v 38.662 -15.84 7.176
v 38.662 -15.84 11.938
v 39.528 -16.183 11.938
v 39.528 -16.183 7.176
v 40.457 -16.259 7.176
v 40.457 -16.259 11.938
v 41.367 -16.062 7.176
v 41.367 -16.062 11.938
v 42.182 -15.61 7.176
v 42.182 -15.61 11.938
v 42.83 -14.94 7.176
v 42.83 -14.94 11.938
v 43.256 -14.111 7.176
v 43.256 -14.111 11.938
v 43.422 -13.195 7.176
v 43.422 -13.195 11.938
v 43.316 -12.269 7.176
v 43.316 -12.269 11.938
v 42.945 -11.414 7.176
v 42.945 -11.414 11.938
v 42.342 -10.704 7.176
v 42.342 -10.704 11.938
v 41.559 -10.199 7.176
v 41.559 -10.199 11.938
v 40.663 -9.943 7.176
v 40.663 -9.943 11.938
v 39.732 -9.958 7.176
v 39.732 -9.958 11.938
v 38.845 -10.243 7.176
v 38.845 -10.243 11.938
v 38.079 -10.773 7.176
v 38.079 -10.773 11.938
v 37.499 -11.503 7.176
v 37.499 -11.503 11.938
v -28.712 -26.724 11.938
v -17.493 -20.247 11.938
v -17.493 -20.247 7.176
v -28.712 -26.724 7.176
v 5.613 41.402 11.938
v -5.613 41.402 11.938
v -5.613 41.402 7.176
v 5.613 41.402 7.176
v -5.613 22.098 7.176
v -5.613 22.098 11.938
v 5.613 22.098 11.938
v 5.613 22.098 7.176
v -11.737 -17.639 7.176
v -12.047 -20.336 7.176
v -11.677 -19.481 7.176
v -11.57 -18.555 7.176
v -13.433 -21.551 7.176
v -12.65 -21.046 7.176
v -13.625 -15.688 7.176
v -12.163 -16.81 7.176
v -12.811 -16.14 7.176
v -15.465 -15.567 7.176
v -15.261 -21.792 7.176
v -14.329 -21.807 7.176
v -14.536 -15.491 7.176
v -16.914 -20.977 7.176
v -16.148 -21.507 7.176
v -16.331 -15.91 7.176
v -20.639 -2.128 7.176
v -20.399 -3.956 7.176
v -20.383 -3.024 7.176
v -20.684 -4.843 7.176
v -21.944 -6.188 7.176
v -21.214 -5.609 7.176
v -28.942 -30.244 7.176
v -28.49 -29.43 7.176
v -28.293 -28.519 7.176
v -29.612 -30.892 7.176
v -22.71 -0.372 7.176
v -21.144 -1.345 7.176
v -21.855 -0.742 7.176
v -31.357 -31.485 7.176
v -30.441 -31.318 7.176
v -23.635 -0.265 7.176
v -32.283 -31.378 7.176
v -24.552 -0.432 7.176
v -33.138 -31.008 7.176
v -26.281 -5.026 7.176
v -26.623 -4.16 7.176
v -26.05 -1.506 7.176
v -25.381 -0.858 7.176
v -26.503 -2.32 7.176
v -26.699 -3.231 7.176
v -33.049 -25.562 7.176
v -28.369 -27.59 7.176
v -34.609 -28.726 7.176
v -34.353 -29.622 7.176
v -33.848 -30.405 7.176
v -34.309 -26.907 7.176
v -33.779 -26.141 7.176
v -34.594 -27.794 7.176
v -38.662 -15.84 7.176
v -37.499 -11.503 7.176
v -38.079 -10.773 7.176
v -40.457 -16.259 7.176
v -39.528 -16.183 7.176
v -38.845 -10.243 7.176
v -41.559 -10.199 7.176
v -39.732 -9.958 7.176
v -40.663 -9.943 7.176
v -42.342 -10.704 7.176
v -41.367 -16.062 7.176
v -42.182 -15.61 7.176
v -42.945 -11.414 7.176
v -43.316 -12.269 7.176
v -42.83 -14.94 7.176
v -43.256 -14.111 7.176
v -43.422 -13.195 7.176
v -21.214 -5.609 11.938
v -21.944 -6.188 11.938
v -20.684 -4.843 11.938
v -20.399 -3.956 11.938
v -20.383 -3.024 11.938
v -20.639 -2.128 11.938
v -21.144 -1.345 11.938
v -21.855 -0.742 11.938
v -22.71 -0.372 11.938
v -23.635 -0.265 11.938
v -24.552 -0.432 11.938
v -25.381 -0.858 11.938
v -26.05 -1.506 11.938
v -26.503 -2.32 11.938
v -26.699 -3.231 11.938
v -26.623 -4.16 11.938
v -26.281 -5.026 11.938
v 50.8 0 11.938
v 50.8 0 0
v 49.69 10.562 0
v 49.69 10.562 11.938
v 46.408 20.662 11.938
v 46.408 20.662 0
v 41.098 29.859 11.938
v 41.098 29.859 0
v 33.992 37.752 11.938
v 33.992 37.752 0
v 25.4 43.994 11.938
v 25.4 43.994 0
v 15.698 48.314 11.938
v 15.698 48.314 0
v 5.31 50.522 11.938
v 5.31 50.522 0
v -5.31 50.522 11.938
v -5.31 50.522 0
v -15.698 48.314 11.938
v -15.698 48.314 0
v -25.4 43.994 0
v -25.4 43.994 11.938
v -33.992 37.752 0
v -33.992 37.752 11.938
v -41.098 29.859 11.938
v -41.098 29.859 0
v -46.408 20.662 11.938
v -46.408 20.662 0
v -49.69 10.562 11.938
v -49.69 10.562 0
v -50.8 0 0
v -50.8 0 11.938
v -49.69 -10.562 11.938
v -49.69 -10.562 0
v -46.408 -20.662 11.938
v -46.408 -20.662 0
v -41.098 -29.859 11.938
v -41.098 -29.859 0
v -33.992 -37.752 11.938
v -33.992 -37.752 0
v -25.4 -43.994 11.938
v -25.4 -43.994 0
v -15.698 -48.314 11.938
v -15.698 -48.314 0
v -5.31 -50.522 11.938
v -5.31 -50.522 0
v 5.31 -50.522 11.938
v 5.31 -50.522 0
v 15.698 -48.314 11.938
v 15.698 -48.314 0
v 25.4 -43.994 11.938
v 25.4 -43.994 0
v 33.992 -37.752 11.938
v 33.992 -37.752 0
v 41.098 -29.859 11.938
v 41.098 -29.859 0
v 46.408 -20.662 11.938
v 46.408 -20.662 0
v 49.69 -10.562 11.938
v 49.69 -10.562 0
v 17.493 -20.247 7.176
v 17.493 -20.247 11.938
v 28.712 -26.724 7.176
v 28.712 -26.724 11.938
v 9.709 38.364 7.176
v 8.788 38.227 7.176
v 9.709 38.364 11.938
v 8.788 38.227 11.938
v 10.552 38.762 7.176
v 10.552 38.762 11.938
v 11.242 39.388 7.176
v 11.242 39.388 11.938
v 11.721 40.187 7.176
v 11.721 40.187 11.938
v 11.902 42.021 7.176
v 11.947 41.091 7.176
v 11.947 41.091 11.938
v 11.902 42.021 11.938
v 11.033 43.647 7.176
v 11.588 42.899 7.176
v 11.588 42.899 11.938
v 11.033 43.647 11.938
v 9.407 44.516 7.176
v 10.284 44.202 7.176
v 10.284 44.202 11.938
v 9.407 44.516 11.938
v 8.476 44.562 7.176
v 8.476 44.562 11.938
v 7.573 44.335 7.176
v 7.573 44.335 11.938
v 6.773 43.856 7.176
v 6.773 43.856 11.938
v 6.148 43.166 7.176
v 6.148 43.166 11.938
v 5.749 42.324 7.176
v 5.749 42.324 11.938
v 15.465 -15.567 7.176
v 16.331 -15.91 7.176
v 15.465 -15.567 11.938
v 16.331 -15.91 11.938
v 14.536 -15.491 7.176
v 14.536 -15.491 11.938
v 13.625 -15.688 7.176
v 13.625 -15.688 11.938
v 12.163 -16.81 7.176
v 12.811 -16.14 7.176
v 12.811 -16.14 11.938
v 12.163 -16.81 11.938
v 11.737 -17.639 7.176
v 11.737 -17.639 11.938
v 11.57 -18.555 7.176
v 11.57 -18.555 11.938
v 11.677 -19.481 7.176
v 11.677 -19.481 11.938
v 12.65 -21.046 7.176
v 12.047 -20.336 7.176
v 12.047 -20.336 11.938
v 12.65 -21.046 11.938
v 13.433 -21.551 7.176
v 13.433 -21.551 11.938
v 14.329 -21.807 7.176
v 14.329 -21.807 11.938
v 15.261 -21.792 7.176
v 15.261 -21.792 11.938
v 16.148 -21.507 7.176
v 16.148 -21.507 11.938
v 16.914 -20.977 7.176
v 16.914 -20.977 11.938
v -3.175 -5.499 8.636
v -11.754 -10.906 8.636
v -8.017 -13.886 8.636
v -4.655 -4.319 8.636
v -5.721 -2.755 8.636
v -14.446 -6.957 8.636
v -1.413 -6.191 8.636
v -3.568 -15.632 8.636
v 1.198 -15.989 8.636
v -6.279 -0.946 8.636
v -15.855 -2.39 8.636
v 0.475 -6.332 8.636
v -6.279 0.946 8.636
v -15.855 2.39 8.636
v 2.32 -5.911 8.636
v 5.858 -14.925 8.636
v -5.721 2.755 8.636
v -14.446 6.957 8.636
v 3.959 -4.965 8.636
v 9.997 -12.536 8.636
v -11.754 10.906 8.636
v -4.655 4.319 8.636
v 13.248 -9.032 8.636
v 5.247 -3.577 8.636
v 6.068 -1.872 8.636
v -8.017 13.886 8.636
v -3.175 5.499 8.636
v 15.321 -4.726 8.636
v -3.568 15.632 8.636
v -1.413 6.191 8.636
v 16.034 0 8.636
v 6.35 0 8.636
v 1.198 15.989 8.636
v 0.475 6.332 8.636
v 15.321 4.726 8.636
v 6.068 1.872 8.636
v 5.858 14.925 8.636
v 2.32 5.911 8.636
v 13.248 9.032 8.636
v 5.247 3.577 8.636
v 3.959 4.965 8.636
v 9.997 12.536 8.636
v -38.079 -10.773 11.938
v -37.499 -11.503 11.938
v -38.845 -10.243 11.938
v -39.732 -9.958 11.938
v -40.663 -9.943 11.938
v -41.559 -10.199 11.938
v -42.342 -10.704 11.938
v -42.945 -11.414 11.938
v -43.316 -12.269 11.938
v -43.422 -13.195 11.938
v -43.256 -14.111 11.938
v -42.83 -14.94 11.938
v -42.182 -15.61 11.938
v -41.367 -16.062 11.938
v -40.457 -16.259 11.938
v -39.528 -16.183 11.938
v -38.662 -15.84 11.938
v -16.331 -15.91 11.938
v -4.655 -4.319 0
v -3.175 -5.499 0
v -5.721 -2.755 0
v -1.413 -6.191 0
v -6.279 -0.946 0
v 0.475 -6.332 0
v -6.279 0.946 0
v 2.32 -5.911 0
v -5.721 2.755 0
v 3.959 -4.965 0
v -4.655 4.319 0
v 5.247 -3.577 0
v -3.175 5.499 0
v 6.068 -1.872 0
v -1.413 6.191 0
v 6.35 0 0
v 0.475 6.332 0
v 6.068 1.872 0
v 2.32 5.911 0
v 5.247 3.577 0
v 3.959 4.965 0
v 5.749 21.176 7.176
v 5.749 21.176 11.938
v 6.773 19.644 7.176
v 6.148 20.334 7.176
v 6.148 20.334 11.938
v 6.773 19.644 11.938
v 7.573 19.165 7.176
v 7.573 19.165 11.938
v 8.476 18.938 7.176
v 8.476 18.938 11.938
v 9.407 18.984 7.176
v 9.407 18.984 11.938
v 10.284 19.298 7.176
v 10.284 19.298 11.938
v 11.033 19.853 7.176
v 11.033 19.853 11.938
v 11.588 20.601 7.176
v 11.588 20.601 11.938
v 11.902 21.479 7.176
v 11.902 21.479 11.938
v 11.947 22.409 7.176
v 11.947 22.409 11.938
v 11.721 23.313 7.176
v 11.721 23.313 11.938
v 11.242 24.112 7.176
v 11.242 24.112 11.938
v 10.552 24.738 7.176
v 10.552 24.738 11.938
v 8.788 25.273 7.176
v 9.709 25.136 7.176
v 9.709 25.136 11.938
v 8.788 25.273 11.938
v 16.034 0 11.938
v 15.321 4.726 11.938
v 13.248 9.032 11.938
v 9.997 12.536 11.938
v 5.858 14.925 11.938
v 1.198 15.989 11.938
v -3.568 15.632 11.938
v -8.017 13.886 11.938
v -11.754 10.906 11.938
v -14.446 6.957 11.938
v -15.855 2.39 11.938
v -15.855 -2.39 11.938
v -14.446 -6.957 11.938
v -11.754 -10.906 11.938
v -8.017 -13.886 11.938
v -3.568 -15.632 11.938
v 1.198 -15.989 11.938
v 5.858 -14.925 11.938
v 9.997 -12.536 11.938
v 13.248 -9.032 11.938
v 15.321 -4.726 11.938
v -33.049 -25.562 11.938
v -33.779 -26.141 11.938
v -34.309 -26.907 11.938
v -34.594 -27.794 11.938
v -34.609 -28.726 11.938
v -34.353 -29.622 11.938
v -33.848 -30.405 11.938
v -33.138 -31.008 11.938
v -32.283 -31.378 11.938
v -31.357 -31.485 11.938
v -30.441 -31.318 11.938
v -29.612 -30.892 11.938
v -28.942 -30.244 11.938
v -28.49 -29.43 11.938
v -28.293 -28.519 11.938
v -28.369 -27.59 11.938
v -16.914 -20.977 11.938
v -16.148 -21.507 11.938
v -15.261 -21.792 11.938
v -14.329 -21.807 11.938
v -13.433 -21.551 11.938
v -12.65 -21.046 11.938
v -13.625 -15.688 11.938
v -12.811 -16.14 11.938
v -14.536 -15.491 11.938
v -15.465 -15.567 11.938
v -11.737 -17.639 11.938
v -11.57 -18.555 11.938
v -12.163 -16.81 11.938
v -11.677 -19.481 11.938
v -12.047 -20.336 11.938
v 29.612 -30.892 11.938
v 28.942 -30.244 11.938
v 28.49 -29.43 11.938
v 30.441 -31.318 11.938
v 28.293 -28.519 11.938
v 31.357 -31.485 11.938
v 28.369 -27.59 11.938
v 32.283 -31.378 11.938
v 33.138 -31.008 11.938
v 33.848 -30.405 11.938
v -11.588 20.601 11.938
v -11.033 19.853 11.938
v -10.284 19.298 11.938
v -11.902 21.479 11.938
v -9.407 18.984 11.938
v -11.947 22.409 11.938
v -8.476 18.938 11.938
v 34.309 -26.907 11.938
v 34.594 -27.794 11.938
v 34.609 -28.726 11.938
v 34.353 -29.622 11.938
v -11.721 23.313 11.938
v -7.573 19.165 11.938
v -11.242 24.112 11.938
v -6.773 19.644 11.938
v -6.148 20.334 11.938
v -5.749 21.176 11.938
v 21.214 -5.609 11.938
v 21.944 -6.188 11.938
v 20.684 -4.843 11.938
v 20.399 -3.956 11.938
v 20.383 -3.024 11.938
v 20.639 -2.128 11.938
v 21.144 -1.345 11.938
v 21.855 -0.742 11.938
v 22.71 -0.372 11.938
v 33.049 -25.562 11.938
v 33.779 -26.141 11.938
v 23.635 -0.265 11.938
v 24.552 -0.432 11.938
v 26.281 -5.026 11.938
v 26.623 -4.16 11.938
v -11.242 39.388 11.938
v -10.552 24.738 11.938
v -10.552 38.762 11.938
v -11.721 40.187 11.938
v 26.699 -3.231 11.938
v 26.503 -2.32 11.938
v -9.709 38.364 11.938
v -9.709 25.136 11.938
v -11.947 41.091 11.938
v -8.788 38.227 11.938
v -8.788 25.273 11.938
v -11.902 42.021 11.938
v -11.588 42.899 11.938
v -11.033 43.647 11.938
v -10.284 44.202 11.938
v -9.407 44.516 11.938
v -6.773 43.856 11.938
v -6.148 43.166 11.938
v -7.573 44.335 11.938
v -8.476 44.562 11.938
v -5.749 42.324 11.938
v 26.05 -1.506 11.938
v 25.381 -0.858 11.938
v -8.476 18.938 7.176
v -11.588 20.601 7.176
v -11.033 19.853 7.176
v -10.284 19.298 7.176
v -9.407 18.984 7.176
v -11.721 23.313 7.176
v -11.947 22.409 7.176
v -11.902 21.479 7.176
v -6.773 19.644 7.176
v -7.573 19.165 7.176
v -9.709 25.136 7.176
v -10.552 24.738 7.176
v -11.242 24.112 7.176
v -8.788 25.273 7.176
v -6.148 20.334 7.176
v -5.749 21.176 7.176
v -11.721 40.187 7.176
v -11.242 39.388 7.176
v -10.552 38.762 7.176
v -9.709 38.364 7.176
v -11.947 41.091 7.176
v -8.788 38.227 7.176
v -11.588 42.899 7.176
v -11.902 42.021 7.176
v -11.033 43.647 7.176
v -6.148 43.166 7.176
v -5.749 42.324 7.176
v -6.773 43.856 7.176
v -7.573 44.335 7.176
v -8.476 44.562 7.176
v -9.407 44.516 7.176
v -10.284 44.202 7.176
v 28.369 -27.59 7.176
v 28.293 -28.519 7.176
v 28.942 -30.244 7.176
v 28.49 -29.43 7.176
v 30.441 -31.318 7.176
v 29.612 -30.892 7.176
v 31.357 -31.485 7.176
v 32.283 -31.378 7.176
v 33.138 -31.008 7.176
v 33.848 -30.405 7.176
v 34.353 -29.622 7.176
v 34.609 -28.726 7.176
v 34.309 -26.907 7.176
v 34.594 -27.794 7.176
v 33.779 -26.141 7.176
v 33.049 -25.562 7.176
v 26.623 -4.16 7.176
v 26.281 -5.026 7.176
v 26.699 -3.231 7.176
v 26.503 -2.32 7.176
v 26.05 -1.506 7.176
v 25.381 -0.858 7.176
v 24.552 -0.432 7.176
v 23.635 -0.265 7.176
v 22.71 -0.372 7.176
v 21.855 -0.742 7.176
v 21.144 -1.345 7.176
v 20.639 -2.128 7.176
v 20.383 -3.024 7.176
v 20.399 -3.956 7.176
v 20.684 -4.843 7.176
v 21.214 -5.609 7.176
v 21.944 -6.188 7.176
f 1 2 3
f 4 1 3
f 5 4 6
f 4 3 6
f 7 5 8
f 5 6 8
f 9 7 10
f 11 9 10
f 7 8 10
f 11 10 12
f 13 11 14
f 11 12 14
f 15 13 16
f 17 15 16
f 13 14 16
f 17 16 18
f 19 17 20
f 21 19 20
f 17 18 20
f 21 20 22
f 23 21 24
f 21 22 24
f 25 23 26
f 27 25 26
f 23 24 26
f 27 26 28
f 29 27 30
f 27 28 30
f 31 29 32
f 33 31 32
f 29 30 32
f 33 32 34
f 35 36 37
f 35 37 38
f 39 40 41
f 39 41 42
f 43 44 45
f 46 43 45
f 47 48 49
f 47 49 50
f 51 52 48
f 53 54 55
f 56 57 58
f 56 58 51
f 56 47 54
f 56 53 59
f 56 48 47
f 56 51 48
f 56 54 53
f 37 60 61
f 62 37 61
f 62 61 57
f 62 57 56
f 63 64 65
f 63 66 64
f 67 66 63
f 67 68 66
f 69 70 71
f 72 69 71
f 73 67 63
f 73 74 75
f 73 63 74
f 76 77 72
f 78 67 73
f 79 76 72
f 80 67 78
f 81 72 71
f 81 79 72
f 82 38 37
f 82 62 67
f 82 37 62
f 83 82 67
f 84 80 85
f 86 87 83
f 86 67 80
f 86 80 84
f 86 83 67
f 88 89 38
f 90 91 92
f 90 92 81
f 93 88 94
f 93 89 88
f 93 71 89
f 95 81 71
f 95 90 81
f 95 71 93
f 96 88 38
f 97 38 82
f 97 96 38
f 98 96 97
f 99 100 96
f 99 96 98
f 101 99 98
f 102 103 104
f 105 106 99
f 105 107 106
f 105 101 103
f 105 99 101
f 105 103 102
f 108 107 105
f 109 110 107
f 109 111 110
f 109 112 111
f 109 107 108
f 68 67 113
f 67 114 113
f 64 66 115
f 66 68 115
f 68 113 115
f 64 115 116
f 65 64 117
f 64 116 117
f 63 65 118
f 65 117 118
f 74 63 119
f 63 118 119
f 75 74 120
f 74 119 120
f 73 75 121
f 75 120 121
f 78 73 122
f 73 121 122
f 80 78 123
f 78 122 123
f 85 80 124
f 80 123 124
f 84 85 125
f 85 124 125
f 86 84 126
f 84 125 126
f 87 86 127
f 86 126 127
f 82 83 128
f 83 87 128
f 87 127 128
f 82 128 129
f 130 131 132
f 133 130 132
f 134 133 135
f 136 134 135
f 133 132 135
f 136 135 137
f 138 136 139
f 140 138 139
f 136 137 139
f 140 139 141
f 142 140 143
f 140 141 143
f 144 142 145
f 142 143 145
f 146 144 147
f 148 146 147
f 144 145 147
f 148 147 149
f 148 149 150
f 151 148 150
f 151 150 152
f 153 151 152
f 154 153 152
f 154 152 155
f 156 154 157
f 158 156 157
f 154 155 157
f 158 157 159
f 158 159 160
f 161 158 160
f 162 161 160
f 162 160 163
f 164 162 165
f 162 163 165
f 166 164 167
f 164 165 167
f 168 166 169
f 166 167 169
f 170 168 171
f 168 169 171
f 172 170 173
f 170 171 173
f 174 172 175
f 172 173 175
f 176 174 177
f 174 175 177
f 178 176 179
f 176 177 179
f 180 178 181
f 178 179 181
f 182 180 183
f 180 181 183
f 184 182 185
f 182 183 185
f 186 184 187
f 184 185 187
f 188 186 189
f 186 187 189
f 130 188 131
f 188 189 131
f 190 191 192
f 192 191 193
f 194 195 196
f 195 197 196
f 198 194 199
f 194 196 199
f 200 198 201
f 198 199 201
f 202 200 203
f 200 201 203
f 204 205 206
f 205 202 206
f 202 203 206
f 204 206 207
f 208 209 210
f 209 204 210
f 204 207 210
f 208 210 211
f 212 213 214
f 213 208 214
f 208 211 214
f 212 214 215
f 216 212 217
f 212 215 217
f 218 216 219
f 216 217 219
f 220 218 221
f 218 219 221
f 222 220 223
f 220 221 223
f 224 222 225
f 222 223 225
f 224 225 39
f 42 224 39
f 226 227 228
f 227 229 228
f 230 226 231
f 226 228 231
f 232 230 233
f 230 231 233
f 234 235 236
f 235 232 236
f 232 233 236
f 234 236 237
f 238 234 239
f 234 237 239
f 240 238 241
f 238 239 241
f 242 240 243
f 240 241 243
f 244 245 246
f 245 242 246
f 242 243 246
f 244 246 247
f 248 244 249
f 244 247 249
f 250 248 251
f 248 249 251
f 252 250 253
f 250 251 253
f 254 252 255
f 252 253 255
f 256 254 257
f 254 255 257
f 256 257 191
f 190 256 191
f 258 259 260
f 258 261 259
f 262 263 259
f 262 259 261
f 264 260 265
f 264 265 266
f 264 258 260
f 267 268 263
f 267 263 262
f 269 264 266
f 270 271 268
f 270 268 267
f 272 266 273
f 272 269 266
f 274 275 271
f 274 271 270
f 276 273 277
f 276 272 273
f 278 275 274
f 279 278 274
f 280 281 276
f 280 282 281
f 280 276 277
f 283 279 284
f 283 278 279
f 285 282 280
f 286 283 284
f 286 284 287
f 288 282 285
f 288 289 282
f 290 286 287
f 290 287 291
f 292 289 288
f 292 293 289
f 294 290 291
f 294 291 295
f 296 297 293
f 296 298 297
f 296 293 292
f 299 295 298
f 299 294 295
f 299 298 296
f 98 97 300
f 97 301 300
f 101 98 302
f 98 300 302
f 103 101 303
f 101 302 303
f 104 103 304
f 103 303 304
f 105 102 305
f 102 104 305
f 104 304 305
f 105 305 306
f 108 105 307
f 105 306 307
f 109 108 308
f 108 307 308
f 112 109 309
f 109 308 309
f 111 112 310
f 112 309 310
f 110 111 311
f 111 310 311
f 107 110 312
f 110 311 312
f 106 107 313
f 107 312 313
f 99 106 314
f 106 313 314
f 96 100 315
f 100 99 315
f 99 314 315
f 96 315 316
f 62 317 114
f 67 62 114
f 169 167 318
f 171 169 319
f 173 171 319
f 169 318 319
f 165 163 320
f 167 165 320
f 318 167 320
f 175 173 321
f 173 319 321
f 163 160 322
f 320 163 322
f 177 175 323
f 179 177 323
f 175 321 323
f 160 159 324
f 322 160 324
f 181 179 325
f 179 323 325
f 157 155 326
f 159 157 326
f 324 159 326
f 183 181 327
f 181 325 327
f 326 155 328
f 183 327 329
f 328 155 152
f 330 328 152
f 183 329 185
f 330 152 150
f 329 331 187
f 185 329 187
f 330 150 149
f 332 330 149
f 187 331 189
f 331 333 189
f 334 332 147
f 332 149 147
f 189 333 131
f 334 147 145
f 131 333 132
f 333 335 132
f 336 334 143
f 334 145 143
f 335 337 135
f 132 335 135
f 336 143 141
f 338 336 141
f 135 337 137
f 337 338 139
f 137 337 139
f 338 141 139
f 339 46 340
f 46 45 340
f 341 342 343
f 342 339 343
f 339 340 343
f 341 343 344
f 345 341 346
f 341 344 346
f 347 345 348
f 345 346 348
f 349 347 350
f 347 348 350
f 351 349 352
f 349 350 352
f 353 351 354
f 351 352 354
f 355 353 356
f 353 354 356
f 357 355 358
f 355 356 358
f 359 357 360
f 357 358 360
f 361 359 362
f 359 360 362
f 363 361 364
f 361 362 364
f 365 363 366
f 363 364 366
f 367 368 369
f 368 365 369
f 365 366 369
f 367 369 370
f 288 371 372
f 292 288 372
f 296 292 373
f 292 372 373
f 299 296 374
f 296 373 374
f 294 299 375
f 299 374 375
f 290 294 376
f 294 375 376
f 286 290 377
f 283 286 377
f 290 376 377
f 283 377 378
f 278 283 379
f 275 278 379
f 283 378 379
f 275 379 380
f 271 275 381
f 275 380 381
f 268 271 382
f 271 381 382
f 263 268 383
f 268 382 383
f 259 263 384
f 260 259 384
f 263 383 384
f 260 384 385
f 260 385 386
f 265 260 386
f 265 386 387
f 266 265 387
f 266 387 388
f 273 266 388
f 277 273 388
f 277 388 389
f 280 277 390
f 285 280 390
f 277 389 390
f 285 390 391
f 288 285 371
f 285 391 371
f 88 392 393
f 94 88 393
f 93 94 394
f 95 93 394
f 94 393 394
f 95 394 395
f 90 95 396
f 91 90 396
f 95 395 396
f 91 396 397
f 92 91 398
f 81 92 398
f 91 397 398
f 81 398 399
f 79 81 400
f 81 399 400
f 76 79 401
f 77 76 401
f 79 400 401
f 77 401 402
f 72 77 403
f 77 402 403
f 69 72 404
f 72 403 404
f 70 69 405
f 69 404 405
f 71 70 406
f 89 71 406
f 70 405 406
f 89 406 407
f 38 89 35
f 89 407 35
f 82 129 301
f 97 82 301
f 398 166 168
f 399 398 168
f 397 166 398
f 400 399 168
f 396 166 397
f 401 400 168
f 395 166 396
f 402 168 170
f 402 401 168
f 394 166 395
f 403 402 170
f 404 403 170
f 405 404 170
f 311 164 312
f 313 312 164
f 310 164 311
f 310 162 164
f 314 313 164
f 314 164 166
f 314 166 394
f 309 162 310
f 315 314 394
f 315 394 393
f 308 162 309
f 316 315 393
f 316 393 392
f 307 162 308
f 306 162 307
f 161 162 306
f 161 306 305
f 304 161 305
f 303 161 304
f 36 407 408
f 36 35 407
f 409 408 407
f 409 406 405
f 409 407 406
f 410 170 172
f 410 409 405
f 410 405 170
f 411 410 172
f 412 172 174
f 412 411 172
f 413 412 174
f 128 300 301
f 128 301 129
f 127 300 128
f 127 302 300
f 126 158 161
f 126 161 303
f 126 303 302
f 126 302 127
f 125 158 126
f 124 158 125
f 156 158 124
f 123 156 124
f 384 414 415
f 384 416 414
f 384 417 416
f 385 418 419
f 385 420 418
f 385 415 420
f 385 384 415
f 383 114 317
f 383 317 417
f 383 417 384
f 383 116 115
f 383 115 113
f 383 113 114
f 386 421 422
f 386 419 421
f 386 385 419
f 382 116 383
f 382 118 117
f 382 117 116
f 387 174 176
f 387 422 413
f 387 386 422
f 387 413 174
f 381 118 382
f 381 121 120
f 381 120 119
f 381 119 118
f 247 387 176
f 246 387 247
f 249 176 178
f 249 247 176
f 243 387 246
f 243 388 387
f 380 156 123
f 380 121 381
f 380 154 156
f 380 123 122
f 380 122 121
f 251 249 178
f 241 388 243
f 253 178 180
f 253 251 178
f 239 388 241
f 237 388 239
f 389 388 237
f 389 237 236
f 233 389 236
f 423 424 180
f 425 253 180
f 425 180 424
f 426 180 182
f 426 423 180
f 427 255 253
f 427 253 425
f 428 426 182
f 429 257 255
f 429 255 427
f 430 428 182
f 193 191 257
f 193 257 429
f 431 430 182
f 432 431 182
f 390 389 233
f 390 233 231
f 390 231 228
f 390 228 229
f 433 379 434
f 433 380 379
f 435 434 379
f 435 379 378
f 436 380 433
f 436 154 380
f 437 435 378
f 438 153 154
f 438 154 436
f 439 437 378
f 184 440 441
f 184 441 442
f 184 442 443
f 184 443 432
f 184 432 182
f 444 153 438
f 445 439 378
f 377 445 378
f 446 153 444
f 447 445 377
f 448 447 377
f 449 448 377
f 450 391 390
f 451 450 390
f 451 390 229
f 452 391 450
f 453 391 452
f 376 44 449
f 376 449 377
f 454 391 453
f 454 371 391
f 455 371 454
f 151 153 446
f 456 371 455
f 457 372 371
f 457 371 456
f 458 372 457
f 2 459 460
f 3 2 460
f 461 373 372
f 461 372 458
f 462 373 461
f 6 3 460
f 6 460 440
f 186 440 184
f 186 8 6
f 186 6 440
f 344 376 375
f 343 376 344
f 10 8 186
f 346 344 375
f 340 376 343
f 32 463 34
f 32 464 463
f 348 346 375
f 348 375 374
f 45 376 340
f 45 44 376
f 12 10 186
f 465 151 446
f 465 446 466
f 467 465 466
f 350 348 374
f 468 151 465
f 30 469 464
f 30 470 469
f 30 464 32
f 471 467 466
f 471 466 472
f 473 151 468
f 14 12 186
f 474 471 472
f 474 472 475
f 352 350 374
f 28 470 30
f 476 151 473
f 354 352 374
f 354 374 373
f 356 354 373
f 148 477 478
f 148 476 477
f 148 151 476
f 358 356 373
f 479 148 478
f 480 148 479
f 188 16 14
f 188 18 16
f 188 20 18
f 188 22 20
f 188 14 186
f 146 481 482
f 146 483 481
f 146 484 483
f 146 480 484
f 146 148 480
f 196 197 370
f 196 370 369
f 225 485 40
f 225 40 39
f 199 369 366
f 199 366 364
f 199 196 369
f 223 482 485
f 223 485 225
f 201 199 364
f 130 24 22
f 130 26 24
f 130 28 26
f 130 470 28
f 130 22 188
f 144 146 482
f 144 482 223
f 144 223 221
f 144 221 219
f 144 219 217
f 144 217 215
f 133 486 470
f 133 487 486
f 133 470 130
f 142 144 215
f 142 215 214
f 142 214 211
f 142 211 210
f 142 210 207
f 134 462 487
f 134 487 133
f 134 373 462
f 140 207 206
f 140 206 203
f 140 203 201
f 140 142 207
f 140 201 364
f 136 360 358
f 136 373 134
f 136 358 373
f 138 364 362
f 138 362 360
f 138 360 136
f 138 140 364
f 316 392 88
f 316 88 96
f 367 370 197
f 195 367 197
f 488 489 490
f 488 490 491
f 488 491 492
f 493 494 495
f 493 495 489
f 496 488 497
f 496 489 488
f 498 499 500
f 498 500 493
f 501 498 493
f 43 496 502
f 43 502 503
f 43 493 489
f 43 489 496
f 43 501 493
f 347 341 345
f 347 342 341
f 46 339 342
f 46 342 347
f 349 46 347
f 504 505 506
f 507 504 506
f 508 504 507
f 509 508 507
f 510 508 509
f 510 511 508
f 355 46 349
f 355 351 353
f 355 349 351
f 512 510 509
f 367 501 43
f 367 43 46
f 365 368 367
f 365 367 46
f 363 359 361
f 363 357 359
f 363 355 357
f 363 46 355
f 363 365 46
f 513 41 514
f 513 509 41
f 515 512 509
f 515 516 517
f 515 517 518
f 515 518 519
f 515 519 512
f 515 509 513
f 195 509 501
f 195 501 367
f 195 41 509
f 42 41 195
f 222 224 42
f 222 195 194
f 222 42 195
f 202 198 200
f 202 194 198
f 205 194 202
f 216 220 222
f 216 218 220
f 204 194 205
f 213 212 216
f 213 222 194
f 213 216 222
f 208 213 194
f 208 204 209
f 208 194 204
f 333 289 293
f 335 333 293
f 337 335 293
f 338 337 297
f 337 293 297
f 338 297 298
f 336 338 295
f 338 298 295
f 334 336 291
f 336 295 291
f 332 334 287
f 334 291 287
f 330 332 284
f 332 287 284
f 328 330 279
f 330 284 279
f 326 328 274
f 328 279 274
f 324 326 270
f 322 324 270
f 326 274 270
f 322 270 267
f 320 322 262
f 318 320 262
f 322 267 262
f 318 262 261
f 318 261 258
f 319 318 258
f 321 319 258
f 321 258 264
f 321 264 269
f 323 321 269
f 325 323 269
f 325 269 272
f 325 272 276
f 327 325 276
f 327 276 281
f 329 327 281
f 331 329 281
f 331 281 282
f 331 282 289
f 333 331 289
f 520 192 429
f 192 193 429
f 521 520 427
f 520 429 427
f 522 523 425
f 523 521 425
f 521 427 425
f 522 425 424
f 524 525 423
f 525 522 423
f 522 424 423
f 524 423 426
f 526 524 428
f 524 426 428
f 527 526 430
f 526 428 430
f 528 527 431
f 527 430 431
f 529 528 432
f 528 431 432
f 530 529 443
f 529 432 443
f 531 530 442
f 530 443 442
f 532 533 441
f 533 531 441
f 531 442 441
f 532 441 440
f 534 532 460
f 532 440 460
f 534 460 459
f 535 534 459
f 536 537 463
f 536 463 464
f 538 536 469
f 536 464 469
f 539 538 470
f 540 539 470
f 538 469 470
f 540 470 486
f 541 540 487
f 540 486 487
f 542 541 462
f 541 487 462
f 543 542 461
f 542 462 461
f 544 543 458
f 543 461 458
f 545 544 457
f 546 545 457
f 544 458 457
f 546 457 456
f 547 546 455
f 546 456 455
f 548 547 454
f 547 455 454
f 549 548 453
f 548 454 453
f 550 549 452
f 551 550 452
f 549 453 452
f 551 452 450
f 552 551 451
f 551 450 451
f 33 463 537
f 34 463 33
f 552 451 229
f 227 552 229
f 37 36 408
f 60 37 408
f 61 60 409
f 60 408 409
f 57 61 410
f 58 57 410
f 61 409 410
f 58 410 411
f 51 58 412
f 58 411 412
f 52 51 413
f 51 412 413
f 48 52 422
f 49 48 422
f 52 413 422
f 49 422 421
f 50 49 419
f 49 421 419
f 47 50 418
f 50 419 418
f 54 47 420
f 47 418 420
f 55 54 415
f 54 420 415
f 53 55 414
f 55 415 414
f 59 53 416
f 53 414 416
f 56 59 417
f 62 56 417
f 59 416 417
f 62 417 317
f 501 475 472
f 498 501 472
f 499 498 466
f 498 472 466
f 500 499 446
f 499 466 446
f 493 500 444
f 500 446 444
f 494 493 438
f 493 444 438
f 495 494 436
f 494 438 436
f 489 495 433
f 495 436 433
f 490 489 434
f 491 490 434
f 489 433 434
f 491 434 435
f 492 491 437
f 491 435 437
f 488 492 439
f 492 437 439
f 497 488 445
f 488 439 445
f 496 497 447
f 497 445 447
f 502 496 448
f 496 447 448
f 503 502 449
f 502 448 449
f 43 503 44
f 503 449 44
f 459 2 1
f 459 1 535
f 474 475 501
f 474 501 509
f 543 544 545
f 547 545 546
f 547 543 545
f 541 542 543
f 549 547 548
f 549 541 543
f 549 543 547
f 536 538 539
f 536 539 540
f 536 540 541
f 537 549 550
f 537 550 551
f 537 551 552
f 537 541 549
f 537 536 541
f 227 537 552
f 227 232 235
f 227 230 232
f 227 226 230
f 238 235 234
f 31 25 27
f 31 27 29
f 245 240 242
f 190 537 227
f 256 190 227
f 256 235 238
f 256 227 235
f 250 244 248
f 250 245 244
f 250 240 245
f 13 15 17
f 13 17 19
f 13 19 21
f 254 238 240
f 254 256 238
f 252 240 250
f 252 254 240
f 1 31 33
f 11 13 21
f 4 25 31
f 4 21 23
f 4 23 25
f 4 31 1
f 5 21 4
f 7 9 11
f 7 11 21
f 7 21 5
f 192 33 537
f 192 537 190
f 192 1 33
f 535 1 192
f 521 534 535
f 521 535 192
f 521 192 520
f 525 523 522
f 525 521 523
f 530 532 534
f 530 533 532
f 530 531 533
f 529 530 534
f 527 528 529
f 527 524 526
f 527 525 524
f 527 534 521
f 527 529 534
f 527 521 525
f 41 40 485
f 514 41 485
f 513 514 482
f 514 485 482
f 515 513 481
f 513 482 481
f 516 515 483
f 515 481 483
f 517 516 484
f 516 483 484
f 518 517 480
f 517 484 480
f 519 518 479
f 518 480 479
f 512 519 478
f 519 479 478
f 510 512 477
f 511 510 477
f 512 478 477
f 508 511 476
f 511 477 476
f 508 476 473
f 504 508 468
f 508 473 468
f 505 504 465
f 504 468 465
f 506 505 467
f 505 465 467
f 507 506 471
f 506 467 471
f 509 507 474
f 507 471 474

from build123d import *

# Parameters (mm, degrees)
SKETCH1_R                = 50.8
BASEPLATE_DEPTH          = 11.938
SKETCH3_R                = 16.03375
MAGNET_INSET_DEPTH       = 3.302
SKETCH4_W                = 17.575320152
SKETCH4_H                = 19.304
DOWEL_SLOT_DEPTH         = 4.7625
SKETCH6_R                = 3.175
DOWEL_SLOT_RELIEFS_DEPTH = 4.7625
DOWEL_SLOT_PATTERN_COUNT = 3
SKETCH7_R                = 6.35
CENTRAL_HOLE_DEPTH       = 73.82716419


with BuildPart() as part:
    # Sketch1 → baseplate (new body)
    with BuildSketch(Plane.XY):
        Circle(SKETCH1_R)
    extrude(amount=BASEPLATE_DEPTH)

    # Sketch3 → magnet_inset (cut)
    with BuildSketch(Plane.XY.offset(11.938)):
        Circle(SKETCH3_R)
    extrude(amount=-MAGNET_INSET_DEPTH, mode=Mode.SUBTRACT)

    # Sketch4 → dowel_slot (cut)
    with BuildSketch(Plane.XY.offset(11.938)):
        with Locations((0, 31.75)):
            Rectangle(SKETCH4_W, SKETCH4_H)
    dowel_slot = extrude(amount=-DOWEL_SLOT_DEPTH, mode=Mode.SUBTRACT)

    # Sketch6 → dowel_slot_reliefs (cut)
    with BuildSketch(Plane.XY.offset(11.938)):
        with Locations((-8.787660076, 41.402)):
            Circle(SKETCH6_R)
        with Locations((8.787660076, 41.402)):
            Circle(SKETCH6_R)
        with Locations((8.787660076, 22.098)):
            Circle(SKETCH6_R)
        with Locations((-8.787660076, 22.098)):
            Circle(SKETCH6_R)
    dowel_slot_reliefs = extrude(amount=-DOWEL_SLOT_RELIEFS_DEPTH, mode=Mode.SUBTRACT)

    # dowel_slot_pattern: dowel_slot, dowel_slot_reliefs ×3 about axis
    dowel_slot_pattern_axis = Axis((0, 0, 0), (0, 0, 1))
    add([dowel_slot.rotate(dowel_slot_pattern_axis, i * 360 / DOWEL_SLOT_PATTERN_COUNT) for i in range(1, DOWEL_SLOT_PATTERN_COUNT)], mode=Mode.SUBTRACT)
    add([dowel_slot_reliefs.rotate(dowel_slot_pattern_axis, i * 360 / DOWEL_SLOT_PATTERN_COUNT) for i in range(1, DOWEL_SLOT_PATTERN_COUNT)], mode=Mode.SUBTRACT)

    # Sketch7 → central_hole (cut, through all)
    with BuildSketch(Plane.XY.offset(11.938)):
        Circle(SKETCH7_R)
    extrude(amount=-CENTRAL_HOLE_DEPTH, mode=Mode.SUBTRACT)


solid = part.part
